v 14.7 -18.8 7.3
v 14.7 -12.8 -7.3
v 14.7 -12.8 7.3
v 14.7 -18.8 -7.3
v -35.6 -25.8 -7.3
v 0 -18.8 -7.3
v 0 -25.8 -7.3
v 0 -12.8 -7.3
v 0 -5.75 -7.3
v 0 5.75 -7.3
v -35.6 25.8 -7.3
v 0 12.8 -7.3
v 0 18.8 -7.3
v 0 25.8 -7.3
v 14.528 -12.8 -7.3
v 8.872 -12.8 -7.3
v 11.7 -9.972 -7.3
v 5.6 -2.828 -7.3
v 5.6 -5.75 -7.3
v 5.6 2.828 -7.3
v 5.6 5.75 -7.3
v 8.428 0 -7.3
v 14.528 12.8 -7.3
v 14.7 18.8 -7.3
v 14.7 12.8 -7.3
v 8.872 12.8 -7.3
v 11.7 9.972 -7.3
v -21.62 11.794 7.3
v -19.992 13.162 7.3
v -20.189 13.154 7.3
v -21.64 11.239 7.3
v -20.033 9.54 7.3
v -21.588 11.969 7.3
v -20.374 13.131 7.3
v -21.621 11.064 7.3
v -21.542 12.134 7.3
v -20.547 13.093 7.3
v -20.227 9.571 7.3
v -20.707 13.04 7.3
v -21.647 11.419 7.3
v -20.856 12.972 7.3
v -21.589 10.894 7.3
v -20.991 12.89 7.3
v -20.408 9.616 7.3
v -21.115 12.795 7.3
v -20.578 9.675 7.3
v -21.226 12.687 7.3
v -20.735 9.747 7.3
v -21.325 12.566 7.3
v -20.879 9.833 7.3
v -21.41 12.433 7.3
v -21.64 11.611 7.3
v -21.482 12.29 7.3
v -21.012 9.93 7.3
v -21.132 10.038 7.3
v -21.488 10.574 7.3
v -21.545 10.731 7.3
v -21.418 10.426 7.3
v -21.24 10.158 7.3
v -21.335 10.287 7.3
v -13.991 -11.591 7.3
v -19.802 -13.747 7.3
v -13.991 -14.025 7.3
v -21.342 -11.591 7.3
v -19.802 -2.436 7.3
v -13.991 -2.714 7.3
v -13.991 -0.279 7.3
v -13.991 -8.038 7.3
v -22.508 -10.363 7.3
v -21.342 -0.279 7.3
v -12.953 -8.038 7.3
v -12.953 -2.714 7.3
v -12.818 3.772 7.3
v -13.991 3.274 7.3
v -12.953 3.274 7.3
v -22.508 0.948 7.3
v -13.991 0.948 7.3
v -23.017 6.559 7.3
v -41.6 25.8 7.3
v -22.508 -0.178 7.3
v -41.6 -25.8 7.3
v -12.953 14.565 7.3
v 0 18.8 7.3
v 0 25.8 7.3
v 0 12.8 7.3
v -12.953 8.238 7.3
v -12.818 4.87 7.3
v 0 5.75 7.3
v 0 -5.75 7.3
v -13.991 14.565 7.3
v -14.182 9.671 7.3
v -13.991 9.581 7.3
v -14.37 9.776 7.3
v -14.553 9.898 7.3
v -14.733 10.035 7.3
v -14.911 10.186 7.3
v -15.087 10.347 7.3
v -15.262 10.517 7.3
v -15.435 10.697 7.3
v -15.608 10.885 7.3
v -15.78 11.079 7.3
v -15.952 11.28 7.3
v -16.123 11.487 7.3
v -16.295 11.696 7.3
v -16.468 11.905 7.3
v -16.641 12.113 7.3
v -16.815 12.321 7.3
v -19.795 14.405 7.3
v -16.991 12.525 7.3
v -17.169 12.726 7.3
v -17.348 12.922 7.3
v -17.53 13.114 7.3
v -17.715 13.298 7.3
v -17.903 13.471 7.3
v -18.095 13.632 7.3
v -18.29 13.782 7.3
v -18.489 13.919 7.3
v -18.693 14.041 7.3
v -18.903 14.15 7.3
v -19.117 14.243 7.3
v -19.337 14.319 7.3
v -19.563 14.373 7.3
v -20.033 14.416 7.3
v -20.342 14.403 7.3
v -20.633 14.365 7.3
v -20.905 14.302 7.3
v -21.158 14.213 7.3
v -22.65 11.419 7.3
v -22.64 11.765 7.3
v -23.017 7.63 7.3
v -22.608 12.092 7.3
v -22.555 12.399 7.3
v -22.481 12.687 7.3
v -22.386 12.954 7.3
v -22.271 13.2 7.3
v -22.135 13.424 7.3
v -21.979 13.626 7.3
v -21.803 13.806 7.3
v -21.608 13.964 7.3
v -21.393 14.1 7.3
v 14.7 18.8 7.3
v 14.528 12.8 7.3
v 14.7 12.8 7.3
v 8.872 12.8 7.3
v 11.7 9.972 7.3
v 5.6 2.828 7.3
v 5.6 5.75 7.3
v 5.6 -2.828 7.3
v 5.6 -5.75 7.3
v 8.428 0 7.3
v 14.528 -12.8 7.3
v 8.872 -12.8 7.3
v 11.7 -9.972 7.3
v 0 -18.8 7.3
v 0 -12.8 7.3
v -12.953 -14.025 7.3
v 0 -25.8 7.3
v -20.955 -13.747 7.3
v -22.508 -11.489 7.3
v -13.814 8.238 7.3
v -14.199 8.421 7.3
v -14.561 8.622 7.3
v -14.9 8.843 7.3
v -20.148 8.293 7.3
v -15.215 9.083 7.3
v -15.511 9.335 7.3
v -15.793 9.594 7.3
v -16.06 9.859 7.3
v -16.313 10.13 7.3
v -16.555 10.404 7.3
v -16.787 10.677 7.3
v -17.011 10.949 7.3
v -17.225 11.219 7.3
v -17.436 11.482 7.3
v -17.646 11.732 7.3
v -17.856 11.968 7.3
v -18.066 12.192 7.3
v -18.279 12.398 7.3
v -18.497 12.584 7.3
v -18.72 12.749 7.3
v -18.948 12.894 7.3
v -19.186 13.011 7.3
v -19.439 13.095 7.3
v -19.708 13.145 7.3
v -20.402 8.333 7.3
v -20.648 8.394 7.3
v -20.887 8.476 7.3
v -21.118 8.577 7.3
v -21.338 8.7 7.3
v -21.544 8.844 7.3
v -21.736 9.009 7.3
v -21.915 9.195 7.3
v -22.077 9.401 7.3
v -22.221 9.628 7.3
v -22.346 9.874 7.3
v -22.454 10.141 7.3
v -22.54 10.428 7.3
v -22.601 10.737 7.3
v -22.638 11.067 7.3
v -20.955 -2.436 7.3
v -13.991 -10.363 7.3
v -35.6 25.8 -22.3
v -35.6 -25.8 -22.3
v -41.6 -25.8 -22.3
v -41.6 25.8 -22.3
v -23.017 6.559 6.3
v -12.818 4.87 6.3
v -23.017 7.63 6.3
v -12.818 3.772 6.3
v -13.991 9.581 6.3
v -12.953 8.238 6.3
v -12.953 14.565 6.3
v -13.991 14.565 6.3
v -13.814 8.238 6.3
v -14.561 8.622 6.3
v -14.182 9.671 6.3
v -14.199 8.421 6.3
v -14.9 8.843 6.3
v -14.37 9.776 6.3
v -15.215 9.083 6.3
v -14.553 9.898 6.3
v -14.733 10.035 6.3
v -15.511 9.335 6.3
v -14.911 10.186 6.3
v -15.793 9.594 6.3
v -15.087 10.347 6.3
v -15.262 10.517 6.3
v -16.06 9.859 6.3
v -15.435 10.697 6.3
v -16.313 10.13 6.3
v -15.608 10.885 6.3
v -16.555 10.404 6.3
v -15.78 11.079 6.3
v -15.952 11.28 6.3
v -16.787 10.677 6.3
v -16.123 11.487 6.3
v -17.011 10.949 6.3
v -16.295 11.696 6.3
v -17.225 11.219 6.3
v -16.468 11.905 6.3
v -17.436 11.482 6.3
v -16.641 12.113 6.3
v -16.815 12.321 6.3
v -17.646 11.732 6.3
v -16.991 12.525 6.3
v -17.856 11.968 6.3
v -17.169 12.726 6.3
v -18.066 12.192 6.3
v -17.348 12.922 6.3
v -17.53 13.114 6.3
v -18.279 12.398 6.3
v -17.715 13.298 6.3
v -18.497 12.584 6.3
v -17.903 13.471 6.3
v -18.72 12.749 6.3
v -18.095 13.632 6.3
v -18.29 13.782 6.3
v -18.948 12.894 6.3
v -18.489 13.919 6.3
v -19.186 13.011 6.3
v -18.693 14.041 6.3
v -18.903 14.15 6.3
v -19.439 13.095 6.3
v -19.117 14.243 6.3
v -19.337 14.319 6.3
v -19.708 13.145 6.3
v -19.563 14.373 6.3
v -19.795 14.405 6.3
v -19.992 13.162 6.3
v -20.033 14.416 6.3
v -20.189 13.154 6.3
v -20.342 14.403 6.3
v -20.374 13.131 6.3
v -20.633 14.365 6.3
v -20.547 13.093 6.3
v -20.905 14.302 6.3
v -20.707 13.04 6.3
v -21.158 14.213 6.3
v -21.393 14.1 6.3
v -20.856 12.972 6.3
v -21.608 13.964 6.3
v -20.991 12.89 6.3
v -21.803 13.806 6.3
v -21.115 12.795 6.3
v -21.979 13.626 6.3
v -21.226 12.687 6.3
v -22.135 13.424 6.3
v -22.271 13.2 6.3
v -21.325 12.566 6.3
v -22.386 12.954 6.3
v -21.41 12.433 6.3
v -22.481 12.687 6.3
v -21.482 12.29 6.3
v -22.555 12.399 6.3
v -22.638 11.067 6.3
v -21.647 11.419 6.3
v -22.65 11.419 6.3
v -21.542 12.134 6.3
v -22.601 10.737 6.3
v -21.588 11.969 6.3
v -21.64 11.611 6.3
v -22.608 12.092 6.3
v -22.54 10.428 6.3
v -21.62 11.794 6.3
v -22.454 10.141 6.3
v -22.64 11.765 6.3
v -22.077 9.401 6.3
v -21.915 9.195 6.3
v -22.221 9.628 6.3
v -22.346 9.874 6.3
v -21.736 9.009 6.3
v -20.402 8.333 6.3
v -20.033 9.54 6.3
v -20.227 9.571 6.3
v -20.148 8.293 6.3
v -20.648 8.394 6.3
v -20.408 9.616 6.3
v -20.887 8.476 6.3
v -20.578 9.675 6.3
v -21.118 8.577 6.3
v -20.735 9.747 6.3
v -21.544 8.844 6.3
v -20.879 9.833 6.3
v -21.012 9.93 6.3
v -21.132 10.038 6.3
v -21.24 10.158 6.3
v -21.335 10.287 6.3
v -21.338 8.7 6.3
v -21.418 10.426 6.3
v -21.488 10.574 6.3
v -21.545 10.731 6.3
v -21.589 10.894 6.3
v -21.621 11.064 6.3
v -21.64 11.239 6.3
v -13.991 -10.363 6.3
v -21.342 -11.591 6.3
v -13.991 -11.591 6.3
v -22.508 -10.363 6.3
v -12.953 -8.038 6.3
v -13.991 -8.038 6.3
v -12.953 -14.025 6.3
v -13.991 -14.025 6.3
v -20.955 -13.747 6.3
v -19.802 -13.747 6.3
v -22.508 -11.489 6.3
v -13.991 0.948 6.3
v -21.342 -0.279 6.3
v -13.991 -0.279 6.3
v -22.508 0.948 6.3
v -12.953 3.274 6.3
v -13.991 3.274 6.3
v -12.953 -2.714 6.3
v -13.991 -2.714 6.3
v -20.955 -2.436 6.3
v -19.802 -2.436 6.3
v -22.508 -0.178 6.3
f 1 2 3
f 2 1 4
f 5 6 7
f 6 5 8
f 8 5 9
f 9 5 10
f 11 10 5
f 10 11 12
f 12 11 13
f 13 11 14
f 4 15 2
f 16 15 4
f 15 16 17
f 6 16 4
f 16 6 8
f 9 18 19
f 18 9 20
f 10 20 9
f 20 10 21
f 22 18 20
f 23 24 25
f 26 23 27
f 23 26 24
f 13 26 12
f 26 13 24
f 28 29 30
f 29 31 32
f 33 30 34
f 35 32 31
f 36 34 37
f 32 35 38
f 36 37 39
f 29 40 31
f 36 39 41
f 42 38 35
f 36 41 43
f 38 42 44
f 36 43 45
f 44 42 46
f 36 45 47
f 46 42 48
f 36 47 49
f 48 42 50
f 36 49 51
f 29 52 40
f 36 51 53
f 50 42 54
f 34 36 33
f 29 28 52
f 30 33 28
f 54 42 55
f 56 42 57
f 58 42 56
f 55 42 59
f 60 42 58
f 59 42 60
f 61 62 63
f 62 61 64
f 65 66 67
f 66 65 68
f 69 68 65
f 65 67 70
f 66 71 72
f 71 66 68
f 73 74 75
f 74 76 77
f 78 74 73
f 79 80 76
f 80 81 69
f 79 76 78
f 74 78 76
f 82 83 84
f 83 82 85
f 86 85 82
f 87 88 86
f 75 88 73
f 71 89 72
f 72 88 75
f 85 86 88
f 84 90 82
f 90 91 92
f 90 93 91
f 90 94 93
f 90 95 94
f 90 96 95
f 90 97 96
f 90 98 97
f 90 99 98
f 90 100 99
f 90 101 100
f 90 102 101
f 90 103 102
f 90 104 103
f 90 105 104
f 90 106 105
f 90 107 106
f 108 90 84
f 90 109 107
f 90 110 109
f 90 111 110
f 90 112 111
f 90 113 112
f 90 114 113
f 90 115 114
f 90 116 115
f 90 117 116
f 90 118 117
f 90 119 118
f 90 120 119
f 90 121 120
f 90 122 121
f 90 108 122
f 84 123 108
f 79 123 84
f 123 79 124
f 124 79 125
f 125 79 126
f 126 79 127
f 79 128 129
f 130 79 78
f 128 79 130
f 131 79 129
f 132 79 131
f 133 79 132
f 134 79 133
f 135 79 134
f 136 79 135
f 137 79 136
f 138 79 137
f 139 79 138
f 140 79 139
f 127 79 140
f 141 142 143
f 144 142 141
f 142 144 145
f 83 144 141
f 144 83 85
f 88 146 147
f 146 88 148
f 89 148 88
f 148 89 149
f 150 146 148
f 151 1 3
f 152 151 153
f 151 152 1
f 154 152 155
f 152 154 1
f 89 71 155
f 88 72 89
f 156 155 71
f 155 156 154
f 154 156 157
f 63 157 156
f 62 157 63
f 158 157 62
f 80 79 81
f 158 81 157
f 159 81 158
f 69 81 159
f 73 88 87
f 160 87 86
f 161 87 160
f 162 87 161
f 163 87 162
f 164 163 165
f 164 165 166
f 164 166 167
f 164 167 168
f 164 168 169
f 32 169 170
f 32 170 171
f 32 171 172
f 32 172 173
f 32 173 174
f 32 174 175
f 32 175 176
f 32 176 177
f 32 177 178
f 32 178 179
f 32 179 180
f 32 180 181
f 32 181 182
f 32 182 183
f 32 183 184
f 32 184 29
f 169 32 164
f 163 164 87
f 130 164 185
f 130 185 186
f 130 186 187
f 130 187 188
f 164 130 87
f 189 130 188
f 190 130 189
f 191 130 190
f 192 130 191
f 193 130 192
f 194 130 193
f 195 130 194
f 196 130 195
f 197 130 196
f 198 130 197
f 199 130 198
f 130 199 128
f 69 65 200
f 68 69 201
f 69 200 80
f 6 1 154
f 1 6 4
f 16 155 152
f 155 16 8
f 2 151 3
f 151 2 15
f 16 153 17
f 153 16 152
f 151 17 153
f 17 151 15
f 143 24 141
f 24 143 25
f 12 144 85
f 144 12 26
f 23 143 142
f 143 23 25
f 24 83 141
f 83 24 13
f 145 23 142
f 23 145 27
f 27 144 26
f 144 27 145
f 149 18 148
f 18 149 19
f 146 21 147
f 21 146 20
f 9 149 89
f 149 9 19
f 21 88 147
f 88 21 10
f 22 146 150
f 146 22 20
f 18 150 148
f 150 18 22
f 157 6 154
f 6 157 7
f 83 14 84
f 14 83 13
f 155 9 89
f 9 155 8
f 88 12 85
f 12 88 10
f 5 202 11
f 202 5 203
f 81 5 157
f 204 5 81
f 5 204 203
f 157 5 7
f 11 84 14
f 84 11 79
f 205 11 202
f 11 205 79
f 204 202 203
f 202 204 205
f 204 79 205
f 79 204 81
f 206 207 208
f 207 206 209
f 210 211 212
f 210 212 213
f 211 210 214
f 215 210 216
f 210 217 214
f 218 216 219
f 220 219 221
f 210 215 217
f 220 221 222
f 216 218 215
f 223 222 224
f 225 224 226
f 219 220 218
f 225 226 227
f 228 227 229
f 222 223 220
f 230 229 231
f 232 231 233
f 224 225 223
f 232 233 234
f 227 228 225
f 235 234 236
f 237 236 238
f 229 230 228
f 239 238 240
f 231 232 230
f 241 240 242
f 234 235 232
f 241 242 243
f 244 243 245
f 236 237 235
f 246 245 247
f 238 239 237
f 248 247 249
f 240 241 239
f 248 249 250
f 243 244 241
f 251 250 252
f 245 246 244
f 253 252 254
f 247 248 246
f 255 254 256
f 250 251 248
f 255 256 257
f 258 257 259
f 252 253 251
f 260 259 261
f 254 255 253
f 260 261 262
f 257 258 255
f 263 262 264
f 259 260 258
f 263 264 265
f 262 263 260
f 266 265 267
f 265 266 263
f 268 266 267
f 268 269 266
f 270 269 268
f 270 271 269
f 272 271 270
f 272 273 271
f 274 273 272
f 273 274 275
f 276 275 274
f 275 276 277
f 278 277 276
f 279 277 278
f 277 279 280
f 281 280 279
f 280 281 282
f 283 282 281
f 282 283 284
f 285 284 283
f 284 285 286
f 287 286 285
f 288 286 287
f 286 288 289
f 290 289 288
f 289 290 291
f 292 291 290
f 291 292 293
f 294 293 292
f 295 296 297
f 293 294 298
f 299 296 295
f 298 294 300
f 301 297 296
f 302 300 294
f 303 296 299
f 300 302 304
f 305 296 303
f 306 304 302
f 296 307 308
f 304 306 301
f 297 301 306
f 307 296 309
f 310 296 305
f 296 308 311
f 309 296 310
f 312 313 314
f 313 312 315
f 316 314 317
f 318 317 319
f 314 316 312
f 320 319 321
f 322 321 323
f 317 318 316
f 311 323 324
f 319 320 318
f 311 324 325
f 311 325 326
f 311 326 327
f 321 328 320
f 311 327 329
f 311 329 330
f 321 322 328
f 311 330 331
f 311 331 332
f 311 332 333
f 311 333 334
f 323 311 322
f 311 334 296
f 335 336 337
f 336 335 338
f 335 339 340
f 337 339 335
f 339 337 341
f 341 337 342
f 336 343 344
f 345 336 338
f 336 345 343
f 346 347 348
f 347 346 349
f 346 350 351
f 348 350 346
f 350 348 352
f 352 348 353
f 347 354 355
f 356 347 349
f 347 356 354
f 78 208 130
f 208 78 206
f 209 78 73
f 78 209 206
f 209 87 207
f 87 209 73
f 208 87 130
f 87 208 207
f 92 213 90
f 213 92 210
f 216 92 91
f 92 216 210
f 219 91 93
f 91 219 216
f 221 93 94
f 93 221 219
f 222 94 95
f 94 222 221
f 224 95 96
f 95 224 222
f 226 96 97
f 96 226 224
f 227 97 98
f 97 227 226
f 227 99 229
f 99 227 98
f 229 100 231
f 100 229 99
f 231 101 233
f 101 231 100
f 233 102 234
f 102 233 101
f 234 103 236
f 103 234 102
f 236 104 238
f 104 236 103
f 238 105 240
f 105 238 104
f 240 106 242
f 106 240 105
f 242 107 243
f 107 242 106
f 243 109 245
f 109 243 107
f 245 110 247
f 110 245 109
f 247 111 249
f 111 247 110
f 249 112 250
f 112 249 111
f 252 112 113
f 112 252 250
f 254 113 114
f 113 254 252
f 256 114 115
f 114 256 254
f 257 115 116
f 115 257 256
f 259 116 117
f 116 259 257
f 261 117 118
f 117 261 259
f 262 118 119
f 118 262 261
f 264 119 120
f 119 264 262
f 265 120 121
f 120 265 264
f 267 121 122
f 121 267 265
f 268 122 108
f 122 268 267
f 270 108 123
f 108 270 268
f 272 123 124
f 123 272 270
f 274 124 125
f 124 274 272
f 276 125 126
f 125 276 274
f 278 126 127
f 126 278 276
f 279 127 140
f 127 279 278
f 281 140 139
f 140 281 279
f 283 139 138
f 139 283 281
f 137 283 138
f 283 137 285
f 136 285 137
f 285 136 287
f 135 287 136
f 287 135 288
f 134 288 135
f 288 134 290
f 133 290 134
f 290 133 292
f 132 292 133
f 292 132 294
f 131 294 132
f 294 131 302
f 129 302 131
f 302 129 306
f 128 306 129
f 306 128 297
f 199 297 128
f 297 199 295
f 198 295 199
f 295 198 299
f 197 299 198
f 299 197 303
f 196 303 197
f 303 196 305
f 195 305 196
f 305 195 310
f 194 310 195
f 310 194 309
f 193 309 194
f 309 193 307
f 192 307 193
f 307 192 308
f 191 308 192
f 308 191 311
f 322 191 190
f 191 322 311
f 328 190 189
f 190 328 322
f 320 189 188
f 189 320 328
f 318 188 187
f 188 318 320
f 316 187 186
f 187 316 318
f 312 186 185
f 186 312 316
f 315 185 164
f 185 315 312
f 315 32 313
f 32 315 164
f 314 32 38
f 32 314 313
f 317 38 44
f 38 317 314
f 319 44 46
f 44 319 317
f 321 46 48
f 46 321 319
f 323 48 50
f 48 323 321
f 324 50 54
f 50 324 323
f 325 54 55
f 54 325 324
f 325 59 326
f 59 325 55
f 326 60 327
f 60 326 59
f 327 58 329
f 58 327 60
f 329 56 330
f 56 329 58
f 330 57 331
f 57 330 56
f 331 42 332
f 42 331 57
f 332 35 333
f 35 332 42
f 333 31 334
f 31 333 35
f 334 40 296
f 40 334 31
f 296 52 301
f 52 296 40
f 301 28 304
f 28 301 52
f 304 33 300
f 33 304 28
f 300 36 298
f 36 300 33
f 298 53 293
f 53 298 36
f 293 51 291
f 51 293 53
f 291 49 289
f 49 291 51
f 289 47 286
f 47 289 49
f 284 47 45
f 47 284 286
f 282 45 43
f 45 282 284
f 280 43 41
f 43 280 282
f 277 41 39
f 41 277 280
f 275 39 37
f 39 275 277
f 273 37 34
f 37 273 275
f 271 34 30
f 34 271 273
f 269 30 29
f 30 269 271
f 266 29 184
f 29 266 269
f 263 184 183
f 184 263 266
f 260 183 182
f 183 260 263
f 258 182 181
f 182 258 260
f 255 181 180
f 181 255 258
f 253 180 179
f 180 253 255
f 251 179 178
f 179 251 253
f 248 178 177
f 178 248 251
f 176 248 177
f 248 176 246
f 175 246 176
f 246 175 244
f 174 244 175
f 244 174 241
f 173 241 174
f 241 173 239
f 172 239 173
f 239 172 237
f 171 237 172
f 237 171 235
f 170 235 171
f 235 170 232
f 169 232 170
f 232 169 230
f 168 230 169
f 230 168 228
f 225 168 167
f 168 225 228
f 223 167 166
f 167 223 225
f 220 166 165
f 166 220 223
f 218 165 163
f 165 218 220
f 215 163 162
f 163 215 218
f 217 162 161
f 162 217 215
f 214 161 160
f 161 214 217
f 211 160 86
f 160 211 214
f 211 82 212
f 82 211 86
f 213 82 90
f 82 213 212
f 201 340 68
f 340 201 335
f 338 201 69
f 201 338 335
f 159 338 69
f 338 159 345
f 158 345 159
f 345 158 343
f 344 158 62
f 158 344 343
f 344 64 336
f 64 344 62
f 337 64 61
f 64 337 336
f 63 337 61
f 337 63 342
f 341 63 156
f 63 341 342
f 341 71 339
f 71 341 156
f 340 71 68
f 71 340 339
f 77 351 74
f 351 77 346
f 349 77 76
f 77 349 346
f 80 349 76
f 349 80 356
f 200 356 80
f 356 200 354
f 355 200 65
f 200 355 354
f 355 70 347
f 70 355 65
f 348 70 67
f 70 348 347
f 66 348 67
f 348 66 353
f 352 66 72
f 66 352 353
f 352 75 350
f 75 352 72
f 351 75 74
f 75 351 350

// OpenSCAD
// Booleans are set as number because thingiverse customizer does not seem to support booleans variables (checkboxes)

// All dimensions are in millimeters

/* [General] */
// Optional side grips to hold onto the pocket-hole jig
addGrips = 1; // [1:Yes, 0:No]
// Distance (in mm) between the edge of the jig and the edge of the pocket-hole jig and the edge of the wood piece
bodyLength = 35.6; // [10:100]
// Name your jig extension (make sure the text fits with your dimensions)
topText = "1 1/2";
// Height (in mm) of the text
fontSize = 10; // [5:30]

/* [Lip] */
// Optional lip that comes against the edge of the wood piece
addLip = 1; // [1:Yes, 0:No]
// How low (in mm) does this lip go down the wood piece
lipDepth = 15; // [5:30]
// Thickness (in mm) of this lip
lipThickness = 6; // [2:20]

/* [Wings] */
// Side wings that can be used to laterally position the jig on the wood piece (serves as an edge guide)
addWings = 1; // [1:Yes, 0:No]
// Size (in mm) of the wing from the left side of the jig (when viewed from the drill)
leftWing = 13; // [0:100]
// Size (in mm) of the wing from the right side of the jig (when viewed from the drill)
rightWing = 13; // [0:100]
// optional lip on the edge of the left wing
leftWingLip = 0;  // [1:Yes, 0:No]
// optional lip on the edge of the right wing
rightWingLip = 0;  // [1:Yes, 0:No]


/* [Hidden] */
inch = 25.4; // mm

// These are measurements from the Milescraft jig and should thus be common to all designs (not configurable)

// Head
headWidth = 11.5;
cornerSide = 4;
height = 14.6;
depth = 5.6; 

// Body
jigWidthTolerance = 0.2;
jigWidth = 1 * inch + jigWidthTolerance;

// Grip
firstDentTolerance = 0.2;
firstDent = 11.5 + firstDentTolerance;
dentSide = 3.8;
gripWidth = 6; // aribtrary

letter_height = 2;
font = "Liberation Sans";

// Computed
actualLeftWing = (leftWing < gripWidth && addGrips && addWings && !leftWingLip) ? gripWidth : leftWing;
actualRightWing = (rightWing < gripWidth && addGrips && addWings && !rightWingLip) ? gripWidth : rightWing;

// Conditionnal sizing of the body width and middle axis
bodyWidth = jigWidth + (
    addWings ? 
        actualLeftWing + actualRightWing : 
        (addGrips ? gripWidth * 2 : 0)
);
bodyMiddle = addWings ? (actualLeftWing - actualRightWing)/2 : 0;

// These 2 conditional expressions are equivalent to: 
//if (addWings) {
//    bodyWidth = bodyWidth + actualLeftWing + actualRightWing;
//    bodyMiddle = (actualLeftWing - actualRightWing)/2;
//} else if (addGrips) {
//    bodyWidth = bodyWidth + gripWidth * 2;
//}


//   _-*-_-*-_-*-_-*   Modules   *-_-*-_-*-_-*-_   \\


module letter(l) {  // Written in 2014 by Torsten Paul <Torsten.Paul@gmx.de>
  linear_extrude(height=letter_height) {
    text(l, size=fontSize, font=font, halign="center", valign="center", $fn=30);
  }
} // This letter module /\ was imported from the text_on_cube.scad example

module grip(direction) {
    translate([firstDent,direction * jigWidth/2,0]) {
        // Grip Body
        translate([-firstDent/2,direction * gripWidth/2,0]) scale([firstDent + gripWidth,gripWidth,height]) cube(1, center=true);
        // Grip Corner
        rotate([0,0,45])  scale([cornerSide,cornerSide,height]) cube(1, center=true);
    }

}

module lip(length) {
    translate([- lipThickness/2, 0,lipDepth/2]) scale([lipThickness, length, lipDepth + height]) cube(1, center=true);
}

module wingLip(direction, wingLen) {
    wingLipLength = bodyLength + (addLip ? lipThickness : 0);
    
    rotate([0,0,direction * 90]) translate([-1 * (wingLen + jigWidth/2),direction * (wingLipLength)/2,0]) lip(wingLipLength);
}


//   _-*-_-*-_-*-_-*   Assembly   *-_-*-_-*-_-*-_   \\


rotate([-180,0,0]) {
    difference() {
        // Main piece
        union() {
            // Head
            scale([depth*2,headWidth,height]) cube(1, center=true);
            // Middle Dent
            translate([depth,0,0]) rotate([0,0,45])  scale([cornerSide,cornerSide,height]) cube(1, center=true);
            
            // Body (+ optional wings)
            translate([-bodyLength/2,bodyMiddle,0])  scale([bodyLength, bodyWidth, height]) cube(1, center=true);
            
            // Options
            if (addLip) {
                translate([- bodyLength, bodyMiddle, 0]) lip(bodyWidth);
            }
            if (addWings) {
                if (leftWingLip) wingLip(-1, actualLeftWing);
                if (rightWingLip) wingLip(1, actualRightWing);
            }
            if (addGrips) {
                grip(1);
                grip(-1);
            }
        }
        
        // Text if not empty (substracted from the main piece)
        if (topText) {
            translate([-bodyLength/2, bodyMiddle, -height/2+1]) rotate([-180,0,-90]) letter(topText); //  + letter_height
        }
    }
}
